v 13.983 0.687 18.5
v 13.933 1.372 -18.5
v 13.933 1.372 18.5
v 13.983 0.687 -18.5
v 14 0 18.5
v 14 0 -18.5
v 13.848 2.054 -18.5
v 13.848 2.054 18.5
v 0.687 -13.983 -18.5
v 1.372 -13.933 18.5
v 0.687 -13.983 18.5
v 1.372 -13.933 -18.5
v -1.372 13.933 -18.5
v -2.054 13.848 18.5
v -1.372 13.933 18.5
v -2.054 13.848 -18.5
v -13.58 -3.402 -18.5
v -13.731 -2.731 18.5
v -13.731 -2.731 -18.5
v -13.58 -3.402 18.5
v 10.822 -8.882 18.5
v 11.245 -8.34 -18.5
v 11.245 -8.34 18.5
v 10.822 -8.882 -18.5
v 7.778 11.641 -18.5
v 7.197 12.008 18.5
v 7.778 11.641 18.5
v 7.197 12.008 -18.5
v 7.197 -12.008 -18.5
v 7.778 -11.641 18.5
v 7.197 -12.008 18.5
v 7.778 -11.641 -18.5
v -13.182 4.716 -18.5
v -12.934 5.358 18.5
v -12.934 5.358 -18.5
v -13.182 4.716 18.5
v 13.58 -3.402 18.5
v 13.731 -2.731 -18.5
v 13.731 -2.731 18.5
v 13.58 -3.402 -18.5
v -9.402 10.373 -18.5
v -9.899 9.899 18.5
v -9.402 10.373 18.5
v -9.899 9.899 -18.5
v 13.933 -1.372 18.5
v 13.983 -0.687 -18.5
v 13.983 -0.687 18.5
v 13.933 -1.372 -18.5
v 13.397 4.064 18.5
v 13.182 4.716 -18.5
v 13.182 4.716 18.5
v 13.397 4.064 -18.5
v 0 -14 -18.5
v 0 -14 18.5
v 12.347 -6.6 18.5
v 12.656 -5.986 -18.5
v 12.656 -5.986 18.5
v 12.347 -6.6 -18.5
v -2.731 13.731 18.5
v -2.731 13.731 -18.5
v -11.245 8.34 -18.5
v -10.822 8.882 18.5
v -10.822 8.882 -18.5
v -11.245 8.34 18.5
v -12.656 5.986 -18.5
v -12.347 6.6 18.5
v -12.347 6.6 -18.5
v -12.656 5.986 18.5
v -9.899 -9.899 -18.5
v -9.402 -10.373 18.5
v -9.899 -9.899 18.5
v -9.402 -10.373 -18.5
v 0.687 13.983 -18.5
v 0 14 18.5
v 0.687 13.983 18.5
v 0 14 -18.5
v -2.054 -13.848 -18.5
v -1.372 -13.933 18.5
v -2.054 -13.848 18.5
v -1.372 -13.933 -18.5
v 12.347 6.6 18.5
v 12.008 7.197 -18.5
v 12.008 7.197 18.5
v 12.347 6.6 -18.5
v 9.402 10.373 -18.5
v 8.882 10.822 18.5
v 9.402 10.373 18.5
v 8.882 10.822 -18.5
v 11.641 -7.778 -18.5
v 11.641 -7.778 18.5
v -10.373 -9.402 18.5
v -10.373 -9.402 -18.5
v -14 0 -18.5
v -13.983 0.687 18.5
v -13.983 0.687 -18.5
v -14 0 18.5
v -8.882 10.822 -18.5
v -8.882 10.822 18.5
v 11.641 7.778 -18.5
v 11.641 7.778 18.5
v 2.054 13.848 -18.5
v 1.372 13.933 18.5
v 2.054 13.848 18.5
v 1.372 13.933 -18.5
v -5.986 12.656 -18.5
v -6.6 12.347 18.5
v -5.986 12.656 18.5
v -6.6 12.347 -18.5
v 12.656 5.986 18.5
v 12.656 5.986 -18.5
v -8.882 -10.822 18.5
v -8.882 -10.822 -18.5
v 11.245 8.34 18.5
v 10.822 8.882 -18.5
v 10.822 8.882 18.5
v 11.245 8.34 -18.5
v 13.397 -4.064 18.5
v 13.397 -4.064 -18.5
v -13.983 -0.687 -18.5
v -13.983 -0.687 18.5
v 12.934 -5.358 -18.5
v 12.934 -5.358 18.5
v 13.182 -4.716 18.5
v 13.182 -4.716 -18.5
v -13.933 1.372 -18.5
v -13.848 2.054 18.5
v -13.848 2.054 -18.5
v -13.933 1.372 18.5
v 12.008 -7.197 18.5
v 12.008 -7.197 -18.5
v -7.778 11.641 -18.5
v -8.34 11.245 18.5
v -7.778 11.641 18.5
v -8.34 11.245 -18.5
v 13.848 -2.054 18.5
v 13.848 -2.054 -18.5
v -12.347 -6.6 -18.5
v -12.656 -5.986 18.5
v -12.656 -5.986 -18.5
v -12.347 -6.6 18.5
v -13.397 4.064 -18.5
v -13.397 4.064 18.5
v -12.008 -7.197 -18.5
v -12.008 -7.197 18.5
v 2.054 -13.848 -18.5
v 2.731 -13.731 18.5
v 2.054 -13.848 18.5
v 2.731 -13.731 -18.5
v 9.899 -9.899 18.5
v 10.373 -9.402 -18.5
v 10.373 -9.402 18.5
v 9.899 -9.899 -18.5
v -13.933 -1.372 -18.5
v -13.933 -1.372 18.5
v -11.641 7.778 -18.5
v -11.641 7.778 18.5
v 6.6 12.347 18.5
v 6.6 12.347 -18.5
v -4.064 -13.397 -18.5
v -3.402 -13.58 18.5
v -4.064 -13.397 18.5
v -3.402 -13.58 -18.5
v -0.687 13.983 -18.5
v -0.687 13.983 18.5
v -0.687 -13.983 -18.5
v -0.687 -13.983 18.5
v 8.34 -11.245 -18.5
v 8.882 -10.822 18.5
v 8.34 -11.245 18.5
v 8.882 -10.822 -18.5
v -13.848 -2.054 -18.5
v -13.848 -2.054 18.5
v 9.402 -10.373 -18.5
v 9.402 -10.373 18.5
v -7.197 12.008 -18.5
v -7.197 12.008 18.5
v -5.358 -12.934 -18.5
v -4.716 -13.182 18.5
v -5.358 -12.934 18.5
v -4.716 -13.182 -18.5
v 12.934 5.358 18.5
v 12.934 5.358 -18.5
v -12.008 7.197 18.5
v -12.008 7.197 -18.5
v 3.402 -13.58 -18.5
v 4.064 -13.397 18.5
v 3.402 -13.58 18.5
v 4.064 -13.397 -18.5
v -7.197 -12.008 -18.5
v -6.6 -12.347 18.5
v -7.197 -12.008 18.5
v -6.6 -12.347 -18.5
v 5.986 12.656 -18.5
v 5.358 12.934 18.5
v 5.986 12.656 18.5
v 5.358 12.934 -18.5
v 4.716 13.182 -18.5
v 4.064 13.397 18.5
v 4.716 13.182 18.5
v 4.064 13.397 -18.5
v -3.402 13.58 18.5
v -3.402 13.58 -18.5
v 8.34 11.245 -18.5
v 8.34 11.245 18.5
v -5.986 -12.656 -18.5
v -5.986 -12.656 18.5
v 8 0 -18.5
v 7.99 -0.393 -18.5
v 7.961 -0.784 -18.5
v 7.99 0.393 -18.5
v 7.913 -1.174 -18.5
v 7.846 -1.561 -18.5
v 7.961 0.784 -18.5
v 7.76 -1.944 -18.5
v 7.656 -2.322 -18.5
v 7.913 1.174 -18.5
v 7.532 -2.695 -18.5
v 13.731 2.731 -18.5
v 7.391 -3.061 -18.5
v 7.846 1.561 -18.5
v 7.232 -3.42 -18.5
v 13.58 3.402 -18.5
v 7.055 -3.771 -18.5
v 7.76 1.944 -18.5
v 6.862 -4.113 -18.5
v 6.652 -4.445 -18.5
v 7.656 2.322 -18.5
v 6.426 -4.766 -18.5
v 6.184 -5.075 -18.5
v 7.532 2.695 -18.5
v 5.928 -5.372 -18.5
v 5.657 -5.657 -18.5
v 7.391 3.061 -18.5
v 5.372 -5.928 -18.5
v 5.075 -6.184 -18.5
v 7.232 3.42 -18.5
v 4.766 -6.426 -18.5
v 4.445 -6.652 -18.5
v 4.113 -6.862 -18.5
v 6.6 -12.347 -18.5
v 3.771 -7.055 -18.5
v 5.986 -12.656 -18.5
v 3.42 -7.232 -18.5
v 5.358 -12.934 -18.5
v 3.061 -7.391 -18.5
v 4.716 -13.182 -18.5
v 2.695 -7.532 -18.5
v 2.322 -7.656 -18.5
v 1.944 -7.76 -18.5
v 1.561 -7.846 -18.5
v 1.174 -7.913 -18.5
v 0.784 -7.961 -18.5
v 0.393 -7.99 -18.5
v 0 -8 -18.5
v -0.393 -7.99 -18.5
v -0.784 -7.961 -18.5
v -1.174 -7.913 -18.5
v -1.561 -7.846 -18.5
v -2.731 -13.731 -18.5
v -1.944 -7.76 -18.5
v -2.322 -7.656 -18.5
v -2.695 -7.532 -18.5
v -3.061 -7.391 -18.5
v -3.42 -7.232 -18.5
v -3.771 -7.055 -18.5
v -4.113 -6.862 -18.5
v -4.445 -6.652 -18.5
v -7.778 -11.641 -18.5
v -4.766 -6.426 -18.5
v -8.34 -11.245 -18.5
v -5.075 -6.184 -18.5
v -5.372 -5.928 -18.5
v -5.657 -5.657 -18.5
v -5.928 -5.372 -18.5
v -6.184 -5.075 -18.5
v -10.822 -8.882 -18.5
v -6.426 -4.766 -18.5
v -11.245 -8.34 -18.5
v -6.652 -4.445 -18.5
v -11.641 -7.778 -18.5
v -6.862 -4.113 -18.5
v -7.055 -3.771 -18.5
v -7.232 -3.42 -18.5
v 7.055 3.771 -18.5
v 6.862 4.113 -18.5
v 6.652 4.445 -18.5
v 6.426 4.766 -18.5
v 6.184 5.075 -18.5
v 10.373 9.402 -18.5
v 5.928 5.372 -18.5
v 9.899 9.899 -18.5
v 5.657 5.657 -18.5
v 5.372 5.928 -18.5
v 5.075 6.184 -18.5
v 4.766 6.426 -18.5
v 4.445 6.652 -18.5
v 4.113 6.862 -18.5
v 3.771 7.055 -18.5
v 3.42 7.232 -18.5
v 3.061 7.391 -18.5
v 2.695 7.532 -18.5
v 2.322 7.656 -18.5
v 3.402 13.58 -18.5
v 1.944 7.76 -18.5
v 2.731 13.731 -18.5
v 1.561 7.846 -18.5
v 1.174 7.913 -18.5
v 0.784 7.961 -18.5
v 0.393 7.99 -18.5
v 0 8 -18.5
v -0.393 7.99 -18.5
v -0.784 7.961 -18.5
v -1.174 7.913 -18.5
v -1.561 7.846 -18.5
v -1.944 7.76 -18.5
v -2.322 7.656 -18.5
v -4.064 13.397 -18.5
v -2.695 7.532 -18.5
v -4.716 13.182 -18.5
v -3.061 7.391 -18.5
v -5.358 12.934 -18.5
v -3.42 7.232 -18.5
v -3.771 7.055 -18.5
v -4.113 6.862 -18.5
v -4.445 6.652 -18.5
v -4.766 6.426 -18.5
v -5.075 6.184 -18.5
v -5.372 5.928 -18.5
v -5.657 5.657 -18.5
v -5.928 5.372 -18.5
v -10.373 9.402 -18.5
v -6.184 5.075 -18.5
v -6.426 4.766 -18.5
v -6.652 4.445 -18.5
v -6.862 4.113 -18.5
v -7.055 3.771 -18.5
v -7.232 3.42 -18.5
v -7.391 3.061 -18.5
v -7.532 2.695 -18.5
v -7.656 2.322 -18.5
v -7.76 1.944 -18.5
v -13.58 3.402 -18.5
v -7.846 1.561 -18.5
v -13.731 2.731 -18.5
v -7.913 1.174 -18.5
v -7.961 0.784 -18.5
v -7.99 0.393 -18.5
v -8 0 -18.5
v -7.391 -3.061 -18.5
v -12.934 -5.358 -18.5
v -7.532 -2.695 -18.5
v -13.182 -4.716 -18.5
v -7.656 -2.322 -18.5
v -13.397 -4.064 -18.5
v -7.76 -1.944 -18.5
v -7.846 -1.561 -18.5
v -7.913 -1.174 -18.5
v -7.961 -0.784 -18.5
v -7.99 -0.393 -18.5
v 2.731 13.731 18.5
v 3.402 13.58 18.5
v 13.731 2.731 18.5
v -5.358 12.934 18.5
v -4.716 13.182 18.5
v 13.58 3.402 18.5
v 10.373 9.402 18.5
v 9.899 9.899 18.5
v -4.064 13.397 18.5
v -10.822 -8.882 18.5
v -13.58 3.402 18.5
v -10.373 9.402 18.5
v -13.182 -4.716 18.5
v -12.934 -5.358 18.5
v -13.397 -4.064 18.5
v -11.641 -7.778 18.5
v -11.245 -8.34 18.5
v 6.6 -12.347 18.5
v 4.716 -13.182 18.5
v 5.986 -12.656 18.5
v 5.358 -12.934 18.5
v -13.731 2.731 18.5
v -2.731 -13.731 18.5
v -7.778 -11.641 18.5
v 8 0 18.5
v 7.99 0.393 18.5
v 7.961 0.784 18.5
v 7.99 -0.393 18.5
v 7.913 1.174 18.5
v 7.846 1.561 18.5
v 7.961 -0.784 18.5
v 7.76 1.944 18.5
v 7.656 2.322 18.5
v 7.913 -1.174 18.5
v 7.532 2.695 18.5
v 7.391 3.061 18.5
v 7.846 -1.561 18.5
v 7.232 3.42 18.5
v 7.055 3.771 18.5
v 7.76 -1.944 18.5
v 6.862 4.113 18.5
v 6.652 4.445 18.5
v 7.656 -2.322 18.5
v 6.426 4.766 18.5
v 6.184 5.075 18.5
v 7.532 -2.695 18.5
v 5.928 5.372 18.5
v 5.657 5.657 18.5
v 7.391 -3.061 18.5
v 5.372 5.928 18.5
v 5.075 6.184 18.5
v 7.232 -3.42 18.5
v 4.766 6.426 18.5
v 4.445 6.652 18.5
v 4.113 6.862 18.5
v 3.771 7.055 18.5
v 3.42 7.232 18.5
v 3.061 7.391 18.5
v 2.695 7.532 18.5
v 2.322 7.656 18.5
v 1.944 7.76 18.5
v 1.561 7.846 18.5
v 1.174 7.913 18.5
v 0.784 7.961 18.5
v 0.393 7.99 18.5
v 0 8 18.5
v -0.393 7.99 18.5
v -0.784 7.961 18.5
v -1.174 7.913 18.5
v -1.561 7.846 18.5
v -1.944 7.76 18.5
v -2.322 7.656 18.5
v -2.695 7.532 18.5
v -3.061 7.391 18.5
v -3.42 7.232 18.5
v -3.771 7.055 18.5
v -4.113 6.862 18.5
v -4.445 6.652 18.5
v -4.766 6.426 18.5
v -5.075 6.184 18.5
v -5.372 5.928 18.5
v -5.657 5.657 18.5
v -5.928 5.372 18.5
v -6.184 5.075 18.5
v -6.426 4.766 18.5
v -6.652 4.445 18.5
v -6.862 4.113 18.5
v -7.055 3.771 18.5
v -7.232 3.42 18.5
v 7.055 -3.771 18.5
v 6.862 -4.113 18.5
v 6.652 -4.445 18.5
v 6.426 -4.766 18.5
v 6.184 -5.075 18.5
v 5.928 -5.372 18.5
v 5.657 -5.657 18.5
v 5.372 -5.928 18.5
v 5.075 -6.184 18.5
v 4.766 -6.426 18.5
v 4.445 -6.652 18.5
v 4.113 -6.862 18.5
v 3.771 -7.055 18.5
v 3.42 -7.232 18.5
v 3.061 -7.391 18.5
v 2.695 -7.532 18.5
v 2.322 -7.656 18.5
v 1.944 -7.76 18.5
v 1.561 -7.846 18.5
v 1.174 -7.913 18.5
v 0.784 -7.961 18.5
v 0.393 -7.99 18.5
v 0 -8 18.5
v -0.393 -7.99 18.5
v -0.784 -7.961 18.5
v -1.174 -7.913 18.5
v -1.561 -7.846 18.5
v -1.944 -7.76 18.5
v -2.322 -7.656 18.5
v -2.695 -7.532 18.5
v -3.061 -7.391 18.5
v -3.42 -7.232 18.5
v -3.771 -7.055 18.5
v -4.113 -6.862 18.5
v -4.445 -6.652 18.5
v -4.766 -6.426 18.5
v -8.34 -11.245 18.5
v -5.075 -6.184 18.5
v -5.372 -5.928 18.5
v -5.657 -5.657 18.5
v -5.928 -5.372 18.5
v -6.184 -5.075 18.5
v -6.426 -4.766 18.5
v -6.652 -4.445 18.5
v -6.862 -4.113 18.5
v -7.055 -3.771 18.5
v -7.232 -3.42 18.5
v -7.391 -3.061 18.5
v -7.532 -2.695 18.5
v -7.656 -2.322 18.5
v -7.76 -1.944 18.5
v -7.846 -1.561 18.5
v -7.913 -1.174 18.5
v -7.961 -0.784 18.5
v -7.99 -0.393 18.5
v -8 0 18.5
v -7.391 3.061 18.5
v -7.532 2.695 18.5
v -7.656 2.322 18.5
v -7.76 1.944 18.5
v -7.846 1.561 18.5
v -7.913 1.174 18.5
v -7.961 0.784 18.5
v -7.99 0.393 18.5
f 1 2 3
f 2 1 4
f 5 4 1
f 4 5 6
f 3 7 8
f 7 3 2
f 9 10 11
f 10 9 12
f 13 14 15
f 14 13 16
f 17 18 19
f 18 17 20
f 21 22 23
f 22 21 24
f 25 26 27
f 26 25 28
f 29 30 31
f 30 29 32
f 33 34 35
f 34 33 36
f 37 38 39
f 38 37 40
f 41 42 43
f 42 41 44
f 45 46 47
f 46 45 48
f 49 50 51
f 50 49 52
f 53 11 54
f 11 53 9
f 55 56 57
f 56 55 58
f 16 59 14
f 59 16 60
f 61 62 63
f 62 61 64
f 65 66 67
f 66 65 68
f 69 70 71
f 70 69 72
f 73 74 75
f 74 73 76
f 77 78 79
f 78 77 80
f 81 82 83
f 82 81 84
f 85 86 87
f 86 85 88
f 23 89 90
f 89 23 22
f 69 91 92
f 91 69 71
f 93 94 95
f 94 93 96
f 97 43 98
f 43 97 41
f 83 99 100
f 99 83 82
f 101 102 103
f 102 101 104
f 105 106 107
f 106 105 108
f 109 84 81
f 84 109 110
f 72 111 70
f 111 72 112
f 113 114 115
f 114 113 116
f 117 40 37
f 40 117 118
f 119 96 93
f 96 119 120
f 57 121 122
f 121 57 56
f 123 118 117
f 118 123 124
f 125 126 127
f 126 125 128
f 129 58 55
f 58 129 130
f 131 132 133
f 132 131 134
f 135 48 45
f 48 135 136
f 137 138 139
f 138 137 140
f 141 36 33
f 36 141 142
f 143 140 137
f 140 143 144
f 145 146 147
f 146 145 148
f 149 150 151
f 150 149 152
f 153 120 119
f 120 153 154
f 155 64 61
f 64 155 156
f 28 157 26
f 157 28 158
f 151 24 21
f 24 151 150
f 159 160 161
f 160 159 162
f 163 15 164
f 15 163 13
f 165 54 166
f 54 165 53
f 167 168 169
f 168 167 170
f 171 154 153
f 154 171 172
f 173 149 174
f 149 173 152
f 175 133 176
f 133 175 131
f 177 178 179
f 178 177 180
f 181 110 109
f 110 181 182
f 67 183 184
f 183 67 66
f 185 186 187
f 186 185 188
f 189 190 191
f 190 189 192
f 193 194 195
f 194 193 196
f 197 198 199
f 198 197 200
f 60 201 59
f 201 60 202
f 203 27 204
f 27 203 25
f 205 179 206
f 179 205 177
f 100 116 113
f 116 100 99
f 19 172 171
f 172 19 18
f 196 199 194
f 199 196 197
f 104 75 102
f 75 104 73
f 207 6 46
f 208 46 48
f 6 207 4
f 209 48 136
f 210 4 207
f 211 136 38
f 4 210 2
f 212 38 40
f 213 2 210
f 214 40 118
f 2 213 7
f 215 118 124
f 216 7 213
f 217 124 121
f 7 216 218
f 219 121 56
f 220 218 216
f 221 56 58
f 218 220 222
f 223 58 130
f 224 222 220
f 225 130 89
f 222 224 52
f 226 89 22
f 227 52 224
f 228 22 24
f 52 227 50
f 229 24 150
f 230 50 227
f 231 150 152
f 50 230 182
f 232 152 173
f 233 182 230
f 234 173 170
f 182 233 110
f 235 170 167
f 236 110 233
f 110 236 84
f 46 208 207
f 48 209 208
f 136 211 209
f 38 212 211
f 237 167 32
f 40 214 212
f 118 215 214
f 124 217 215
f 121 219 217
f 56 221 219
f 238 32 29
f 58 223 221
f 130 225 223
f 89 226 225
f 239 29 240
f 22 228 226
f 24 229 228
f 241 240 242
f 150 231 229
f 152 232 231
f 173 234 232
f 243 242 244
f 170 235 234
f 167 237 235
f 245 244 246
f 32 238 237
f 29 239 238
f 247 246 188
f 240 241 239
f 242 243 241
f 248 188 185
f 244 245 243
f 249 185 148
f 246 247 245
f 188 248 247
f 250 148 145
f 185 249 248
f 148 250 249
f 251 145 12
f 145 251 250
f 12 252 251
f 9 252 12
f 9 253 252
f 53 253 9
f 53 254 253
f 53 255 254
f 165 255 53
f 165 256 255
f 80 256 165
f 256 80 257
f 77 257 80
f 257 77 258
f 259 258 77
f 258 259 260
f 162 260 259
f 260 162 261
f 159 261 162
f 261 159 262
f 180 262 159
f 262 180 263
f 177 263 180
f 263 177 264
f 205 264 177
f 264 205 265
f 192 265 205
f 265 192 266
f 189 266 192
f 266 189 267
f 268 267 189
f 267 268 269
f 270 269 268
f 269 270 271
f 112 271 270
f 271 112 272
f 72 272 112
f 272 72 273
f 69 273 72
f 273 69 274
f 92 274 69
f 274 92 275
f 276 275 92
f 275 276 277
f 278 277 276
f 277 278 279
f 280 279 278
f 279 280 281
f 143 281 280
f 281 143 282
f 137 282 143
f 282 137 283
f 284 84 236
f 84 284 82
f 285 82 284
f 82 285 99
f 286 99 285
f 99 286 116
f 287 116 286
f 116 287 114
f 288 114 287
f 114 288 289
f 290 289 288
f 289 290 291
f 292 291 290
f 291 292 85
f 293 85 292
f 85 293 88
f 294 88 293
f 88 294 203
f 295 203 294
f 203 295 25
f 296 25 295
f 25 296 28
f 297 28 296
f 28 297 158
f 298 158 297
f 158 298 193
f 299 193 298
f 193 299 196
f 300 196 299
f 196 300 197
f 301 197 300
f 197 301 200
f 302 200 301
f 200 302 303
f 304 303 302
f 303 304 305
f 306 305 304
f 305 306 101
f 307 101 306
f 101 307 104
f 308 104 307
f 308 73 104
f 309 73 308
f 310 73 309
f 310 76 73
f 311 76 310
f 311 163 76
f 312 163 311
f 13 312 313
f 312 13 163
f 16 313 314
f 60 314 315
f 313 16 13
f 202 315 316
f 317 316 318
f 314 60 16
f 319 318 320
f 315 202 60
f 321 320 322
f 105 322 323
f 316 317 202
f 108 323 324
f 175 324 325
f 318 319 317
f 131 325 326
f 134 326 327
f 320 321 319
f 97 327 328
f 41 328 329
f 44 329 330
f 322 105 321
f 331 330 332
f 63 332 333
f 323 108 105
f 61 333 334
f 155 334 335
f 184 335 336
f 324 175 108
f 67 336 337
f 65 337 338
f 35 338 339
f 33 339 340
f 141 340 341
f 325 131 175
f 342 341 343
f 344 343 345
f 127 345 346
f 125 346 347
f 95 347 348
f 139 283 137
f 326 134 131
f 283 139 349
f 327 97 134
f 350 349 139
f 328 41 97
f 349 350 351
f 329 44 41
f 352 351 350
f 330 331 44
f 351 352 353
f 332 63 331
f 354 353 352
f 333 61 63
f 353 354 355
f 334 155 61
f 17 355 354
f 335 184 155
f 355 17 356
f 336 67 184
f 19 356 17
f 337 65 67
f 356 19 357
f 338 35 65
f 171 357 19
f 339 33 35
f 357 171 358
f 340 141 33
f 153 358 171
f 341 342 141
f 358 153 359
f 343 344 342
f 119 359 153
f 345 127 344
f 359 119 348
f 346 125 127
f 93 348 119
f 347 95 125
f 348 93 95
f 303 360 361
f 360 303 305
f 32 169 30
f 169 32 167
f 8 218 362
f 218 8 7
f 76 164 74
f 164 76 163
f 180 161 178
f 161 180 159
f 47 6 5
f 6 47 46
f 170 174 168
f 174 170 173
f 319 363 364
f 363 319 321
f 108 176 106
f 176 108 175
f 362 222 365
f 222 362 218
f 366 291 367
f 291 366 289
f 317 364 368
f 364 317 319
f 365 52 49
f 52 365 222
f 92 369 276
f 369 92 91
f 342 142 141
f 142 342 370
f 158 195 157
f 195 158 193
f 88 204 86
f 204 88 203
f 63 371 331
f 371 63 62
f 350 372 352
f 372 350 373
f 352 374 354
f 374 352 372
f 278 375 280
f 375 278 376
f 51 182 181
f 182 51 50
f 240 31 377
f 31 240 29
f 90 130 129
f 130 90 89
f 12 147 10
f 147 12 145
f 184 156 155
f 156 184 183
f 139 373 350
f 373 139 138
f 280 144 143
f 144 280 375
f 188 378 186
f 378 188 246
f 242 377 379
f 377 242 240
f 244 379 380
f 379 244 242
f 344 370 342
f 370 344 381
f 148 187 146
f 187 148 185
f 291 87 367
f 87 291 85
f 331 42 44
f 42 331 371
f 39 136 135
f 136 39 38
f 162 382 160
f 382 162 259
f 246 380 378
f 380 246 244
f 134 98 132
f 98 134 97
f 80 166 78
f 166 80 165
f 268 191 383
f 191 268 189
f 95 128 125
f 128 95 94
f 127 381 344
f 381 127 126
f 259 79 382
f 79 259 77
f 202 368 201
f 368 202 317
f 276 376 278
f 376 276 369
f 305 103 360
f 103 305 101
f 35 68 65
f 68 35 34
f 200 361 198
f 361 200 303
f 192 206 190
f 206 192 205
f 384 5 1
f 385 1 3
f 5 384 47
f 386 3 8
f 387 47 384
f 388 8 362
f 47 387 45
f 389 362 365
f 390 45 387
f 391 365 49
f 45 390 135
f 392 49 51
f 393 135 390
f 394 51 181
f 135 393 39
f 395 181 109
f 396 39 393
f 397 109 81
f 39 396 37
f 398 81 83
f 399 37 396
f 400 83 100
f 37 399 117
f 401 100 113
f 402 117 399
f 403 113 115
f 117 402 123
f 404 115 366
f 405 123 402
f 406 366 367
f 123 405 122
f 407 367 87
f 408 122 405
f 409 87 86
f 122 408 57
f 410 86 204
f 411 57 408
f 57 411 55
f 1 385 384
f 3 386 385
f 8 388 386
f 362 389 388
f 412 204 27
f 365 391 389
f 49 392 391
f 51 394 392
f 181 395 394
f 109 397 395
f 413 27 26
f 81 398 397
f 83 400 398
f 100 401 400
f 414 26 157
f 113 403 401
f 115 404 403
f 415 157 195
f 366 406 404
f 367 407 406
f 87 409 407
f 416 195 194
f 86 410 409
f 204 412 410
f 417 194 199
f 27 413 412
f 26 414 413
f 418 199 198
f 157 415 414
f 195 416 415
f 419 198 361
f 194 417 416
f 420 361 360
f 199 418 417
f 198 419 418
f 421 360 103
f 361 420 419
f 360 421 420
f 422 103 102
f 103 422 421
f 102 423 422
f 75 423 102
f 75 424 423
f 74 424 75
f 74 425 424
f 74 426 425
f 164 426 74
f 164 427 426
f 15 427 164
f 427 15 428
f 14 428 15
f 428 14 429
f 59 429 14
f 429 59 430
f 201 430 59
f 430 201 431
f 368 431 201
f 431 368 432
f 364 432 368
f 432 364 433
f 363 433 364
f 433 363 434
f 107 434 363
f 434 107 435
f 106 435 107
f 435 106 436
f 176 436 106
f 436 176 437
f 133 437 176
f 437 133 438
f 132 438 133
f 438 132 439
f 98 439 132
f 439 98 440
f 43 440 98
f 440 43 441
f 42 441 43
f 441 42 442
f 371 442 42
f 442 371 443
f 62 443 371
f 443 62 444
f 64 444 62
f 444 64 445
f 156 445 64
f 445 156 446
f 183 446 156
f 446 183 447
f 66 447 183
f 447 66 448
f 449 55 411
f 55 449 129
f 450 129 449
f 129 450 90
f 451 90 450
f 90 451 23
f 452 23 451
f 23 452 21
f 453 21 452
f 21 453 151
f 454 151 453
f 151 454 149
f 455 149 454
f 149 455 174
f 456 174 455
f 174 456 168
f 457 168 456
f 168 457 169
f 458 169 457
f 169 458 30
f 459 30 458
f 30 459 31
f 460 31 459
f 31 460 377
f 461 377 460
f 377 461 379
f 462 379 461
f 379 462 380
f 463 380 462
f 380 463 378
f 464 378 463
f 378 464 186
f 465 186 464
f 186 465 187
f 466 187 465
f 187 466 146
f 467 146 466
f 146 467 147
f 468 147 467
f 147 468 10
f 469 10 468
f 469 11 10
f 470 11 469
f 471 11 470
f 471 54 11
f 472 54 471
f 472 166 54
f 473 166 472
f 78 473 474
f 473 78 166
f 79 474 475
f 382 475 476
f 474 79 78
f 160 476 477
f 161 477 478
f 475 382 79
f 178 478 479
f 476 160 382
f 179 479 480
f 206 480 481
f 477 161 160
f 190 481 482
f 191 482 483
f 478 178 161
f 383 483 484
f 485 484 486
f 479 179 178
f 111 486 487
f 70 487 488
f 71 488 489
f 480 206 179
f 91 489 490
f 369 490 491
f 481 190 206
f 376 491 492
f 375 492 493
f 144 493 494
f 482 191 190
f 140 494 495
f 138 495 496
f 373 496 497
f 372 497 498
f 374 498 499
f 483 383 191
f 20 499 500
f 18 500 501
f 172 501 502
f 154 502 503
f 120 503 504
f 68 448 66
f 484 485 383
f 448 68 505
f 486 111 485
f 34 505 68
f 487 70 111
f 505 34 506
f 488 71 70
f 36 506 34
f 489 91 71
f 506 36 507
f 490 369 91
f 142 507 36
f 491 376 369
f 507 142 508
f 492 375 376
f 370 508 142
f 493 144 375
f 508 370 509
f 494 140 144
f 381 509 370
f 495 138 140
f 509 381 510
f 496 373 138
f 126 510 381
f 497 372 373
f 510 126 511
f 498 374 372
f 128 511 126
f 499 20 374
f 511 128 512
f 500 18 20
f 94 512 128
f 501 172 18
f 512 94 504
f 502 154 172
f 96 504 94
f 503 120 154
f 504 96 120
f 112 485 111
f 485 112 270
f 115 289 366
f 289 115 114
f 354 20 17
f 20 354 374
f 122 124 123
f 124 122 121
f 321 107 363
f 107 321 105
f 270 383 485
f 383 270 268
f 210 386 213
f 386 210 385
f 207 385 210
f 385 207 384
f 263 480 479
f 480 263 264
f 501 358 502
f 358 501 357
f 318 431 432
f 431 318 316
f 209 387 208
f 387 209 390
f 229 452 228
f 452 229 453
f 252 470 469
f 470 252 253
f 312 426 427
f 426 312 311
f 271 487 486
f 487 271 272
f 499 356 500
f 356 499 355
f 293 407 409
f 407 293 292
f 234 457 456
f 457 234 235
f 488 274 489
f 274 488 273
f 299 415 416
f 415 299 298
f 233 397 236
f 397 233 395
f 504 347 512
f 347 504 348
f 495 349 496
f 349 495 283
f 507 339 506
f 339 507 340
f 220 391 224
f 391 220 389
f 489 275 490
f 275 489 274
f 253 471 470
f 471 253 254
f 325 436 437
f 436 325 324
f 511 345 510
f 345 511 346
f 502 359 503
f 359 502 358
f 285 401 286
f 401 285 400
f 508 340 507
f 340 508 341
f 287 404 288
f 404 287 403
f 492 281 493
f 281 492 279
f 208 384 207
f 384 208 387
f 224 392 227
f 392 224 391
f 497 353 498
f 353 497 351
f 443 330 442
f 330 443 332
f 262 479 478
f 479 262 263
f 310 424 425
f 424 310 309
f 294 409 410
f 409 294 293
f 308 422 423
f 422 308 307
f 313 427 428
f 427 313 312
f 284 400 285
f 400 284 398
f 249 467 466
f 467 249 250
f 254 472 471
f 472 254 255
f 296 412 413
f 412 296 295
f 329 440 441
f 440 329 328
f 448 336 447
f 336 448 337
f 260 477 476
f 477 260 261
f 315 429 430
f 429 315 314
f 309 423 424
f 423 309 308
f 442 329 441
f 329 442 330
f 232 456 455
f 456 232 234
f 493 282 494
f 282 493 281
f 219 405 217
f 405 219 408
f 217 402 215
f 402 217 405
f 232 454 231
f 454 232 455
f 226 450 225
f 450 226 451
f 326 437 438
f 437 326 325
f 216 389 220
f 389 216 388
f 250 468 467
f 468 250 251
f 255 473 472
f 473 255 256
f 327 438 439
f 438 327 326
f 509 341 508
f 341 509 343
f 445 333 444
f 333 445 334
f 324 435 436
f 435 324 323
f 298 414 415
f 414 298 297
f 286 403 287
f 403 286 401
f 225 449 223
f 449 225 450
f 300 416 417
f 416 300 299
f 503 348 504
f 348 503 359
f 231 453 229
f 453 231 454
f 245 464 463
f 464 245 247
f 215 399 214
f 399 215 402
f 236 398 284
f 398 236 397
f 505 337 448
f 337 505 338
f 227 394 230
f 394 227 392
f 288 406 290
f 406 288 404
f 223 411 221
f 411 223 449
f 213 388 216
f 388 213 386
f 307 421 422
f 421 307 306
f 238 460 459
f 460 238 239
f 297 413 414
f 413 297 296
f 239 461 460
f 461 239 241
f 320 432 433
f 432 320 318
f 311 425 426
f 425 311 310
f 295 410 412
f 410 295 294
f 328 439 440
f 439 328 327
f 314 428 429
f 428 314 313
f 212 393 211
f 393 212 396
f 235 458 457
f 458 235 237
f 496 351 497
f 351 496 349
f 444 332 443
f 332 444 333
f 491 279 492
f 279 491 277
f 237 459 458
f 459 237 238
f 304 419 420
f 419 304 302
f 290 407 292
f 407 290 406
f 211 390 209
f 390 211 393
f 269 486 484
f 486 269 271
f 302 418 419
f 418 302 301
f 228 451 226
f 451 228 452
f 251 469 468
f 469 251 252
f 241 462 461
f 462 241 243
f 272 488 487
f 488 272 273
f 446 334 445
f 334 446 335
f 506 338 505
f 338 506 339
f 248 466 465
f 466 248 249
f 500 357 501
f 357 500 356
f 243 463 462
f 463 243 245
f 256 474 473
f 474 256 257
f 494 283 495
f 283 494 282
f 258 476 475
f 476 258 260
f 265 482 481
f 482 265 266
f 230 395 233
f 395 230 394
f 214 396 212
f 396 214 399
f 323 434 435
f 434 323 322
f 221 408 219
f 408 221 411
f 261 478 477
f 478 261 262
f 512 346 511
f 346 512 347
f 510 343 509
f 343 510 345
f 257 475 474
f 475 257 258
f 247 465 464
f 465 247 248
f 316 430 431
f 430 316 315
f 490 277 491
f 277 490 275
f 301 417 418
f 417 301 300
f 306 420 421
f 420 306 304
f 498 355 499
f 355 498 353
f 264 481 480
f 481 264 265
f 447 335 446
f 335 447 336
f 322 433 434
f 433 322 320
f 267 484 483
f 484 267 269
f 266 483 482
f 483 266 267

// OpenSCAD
// Linear bearing (standalone sleeve)
// 16.0mm bore, 28.0mm outer diameter, 37.0mm length

$fn = 128;

// Parameters (mm)
bore_diameter_mm  = 16.0;
outer_diameter_mm = 28.0;
length_mm         = 37.0;

// Small overlap to ensure robust boolean operations
connect_overlap_mm = 0.2;

module linear_bearing(bore_d=bore_diameter_mm, od=outer_diameter_mm, L=length_mm) {
    difference() {
        // Outer sleeve
        cylinder(d=od, h=L, center=true);

        // Through-bore (extend beyond ends so it always cuts through)
        cylinder(d=bore_d, h=L + 2*connect_overlap_mm, center=true);
    }
}

linear_bearing();
